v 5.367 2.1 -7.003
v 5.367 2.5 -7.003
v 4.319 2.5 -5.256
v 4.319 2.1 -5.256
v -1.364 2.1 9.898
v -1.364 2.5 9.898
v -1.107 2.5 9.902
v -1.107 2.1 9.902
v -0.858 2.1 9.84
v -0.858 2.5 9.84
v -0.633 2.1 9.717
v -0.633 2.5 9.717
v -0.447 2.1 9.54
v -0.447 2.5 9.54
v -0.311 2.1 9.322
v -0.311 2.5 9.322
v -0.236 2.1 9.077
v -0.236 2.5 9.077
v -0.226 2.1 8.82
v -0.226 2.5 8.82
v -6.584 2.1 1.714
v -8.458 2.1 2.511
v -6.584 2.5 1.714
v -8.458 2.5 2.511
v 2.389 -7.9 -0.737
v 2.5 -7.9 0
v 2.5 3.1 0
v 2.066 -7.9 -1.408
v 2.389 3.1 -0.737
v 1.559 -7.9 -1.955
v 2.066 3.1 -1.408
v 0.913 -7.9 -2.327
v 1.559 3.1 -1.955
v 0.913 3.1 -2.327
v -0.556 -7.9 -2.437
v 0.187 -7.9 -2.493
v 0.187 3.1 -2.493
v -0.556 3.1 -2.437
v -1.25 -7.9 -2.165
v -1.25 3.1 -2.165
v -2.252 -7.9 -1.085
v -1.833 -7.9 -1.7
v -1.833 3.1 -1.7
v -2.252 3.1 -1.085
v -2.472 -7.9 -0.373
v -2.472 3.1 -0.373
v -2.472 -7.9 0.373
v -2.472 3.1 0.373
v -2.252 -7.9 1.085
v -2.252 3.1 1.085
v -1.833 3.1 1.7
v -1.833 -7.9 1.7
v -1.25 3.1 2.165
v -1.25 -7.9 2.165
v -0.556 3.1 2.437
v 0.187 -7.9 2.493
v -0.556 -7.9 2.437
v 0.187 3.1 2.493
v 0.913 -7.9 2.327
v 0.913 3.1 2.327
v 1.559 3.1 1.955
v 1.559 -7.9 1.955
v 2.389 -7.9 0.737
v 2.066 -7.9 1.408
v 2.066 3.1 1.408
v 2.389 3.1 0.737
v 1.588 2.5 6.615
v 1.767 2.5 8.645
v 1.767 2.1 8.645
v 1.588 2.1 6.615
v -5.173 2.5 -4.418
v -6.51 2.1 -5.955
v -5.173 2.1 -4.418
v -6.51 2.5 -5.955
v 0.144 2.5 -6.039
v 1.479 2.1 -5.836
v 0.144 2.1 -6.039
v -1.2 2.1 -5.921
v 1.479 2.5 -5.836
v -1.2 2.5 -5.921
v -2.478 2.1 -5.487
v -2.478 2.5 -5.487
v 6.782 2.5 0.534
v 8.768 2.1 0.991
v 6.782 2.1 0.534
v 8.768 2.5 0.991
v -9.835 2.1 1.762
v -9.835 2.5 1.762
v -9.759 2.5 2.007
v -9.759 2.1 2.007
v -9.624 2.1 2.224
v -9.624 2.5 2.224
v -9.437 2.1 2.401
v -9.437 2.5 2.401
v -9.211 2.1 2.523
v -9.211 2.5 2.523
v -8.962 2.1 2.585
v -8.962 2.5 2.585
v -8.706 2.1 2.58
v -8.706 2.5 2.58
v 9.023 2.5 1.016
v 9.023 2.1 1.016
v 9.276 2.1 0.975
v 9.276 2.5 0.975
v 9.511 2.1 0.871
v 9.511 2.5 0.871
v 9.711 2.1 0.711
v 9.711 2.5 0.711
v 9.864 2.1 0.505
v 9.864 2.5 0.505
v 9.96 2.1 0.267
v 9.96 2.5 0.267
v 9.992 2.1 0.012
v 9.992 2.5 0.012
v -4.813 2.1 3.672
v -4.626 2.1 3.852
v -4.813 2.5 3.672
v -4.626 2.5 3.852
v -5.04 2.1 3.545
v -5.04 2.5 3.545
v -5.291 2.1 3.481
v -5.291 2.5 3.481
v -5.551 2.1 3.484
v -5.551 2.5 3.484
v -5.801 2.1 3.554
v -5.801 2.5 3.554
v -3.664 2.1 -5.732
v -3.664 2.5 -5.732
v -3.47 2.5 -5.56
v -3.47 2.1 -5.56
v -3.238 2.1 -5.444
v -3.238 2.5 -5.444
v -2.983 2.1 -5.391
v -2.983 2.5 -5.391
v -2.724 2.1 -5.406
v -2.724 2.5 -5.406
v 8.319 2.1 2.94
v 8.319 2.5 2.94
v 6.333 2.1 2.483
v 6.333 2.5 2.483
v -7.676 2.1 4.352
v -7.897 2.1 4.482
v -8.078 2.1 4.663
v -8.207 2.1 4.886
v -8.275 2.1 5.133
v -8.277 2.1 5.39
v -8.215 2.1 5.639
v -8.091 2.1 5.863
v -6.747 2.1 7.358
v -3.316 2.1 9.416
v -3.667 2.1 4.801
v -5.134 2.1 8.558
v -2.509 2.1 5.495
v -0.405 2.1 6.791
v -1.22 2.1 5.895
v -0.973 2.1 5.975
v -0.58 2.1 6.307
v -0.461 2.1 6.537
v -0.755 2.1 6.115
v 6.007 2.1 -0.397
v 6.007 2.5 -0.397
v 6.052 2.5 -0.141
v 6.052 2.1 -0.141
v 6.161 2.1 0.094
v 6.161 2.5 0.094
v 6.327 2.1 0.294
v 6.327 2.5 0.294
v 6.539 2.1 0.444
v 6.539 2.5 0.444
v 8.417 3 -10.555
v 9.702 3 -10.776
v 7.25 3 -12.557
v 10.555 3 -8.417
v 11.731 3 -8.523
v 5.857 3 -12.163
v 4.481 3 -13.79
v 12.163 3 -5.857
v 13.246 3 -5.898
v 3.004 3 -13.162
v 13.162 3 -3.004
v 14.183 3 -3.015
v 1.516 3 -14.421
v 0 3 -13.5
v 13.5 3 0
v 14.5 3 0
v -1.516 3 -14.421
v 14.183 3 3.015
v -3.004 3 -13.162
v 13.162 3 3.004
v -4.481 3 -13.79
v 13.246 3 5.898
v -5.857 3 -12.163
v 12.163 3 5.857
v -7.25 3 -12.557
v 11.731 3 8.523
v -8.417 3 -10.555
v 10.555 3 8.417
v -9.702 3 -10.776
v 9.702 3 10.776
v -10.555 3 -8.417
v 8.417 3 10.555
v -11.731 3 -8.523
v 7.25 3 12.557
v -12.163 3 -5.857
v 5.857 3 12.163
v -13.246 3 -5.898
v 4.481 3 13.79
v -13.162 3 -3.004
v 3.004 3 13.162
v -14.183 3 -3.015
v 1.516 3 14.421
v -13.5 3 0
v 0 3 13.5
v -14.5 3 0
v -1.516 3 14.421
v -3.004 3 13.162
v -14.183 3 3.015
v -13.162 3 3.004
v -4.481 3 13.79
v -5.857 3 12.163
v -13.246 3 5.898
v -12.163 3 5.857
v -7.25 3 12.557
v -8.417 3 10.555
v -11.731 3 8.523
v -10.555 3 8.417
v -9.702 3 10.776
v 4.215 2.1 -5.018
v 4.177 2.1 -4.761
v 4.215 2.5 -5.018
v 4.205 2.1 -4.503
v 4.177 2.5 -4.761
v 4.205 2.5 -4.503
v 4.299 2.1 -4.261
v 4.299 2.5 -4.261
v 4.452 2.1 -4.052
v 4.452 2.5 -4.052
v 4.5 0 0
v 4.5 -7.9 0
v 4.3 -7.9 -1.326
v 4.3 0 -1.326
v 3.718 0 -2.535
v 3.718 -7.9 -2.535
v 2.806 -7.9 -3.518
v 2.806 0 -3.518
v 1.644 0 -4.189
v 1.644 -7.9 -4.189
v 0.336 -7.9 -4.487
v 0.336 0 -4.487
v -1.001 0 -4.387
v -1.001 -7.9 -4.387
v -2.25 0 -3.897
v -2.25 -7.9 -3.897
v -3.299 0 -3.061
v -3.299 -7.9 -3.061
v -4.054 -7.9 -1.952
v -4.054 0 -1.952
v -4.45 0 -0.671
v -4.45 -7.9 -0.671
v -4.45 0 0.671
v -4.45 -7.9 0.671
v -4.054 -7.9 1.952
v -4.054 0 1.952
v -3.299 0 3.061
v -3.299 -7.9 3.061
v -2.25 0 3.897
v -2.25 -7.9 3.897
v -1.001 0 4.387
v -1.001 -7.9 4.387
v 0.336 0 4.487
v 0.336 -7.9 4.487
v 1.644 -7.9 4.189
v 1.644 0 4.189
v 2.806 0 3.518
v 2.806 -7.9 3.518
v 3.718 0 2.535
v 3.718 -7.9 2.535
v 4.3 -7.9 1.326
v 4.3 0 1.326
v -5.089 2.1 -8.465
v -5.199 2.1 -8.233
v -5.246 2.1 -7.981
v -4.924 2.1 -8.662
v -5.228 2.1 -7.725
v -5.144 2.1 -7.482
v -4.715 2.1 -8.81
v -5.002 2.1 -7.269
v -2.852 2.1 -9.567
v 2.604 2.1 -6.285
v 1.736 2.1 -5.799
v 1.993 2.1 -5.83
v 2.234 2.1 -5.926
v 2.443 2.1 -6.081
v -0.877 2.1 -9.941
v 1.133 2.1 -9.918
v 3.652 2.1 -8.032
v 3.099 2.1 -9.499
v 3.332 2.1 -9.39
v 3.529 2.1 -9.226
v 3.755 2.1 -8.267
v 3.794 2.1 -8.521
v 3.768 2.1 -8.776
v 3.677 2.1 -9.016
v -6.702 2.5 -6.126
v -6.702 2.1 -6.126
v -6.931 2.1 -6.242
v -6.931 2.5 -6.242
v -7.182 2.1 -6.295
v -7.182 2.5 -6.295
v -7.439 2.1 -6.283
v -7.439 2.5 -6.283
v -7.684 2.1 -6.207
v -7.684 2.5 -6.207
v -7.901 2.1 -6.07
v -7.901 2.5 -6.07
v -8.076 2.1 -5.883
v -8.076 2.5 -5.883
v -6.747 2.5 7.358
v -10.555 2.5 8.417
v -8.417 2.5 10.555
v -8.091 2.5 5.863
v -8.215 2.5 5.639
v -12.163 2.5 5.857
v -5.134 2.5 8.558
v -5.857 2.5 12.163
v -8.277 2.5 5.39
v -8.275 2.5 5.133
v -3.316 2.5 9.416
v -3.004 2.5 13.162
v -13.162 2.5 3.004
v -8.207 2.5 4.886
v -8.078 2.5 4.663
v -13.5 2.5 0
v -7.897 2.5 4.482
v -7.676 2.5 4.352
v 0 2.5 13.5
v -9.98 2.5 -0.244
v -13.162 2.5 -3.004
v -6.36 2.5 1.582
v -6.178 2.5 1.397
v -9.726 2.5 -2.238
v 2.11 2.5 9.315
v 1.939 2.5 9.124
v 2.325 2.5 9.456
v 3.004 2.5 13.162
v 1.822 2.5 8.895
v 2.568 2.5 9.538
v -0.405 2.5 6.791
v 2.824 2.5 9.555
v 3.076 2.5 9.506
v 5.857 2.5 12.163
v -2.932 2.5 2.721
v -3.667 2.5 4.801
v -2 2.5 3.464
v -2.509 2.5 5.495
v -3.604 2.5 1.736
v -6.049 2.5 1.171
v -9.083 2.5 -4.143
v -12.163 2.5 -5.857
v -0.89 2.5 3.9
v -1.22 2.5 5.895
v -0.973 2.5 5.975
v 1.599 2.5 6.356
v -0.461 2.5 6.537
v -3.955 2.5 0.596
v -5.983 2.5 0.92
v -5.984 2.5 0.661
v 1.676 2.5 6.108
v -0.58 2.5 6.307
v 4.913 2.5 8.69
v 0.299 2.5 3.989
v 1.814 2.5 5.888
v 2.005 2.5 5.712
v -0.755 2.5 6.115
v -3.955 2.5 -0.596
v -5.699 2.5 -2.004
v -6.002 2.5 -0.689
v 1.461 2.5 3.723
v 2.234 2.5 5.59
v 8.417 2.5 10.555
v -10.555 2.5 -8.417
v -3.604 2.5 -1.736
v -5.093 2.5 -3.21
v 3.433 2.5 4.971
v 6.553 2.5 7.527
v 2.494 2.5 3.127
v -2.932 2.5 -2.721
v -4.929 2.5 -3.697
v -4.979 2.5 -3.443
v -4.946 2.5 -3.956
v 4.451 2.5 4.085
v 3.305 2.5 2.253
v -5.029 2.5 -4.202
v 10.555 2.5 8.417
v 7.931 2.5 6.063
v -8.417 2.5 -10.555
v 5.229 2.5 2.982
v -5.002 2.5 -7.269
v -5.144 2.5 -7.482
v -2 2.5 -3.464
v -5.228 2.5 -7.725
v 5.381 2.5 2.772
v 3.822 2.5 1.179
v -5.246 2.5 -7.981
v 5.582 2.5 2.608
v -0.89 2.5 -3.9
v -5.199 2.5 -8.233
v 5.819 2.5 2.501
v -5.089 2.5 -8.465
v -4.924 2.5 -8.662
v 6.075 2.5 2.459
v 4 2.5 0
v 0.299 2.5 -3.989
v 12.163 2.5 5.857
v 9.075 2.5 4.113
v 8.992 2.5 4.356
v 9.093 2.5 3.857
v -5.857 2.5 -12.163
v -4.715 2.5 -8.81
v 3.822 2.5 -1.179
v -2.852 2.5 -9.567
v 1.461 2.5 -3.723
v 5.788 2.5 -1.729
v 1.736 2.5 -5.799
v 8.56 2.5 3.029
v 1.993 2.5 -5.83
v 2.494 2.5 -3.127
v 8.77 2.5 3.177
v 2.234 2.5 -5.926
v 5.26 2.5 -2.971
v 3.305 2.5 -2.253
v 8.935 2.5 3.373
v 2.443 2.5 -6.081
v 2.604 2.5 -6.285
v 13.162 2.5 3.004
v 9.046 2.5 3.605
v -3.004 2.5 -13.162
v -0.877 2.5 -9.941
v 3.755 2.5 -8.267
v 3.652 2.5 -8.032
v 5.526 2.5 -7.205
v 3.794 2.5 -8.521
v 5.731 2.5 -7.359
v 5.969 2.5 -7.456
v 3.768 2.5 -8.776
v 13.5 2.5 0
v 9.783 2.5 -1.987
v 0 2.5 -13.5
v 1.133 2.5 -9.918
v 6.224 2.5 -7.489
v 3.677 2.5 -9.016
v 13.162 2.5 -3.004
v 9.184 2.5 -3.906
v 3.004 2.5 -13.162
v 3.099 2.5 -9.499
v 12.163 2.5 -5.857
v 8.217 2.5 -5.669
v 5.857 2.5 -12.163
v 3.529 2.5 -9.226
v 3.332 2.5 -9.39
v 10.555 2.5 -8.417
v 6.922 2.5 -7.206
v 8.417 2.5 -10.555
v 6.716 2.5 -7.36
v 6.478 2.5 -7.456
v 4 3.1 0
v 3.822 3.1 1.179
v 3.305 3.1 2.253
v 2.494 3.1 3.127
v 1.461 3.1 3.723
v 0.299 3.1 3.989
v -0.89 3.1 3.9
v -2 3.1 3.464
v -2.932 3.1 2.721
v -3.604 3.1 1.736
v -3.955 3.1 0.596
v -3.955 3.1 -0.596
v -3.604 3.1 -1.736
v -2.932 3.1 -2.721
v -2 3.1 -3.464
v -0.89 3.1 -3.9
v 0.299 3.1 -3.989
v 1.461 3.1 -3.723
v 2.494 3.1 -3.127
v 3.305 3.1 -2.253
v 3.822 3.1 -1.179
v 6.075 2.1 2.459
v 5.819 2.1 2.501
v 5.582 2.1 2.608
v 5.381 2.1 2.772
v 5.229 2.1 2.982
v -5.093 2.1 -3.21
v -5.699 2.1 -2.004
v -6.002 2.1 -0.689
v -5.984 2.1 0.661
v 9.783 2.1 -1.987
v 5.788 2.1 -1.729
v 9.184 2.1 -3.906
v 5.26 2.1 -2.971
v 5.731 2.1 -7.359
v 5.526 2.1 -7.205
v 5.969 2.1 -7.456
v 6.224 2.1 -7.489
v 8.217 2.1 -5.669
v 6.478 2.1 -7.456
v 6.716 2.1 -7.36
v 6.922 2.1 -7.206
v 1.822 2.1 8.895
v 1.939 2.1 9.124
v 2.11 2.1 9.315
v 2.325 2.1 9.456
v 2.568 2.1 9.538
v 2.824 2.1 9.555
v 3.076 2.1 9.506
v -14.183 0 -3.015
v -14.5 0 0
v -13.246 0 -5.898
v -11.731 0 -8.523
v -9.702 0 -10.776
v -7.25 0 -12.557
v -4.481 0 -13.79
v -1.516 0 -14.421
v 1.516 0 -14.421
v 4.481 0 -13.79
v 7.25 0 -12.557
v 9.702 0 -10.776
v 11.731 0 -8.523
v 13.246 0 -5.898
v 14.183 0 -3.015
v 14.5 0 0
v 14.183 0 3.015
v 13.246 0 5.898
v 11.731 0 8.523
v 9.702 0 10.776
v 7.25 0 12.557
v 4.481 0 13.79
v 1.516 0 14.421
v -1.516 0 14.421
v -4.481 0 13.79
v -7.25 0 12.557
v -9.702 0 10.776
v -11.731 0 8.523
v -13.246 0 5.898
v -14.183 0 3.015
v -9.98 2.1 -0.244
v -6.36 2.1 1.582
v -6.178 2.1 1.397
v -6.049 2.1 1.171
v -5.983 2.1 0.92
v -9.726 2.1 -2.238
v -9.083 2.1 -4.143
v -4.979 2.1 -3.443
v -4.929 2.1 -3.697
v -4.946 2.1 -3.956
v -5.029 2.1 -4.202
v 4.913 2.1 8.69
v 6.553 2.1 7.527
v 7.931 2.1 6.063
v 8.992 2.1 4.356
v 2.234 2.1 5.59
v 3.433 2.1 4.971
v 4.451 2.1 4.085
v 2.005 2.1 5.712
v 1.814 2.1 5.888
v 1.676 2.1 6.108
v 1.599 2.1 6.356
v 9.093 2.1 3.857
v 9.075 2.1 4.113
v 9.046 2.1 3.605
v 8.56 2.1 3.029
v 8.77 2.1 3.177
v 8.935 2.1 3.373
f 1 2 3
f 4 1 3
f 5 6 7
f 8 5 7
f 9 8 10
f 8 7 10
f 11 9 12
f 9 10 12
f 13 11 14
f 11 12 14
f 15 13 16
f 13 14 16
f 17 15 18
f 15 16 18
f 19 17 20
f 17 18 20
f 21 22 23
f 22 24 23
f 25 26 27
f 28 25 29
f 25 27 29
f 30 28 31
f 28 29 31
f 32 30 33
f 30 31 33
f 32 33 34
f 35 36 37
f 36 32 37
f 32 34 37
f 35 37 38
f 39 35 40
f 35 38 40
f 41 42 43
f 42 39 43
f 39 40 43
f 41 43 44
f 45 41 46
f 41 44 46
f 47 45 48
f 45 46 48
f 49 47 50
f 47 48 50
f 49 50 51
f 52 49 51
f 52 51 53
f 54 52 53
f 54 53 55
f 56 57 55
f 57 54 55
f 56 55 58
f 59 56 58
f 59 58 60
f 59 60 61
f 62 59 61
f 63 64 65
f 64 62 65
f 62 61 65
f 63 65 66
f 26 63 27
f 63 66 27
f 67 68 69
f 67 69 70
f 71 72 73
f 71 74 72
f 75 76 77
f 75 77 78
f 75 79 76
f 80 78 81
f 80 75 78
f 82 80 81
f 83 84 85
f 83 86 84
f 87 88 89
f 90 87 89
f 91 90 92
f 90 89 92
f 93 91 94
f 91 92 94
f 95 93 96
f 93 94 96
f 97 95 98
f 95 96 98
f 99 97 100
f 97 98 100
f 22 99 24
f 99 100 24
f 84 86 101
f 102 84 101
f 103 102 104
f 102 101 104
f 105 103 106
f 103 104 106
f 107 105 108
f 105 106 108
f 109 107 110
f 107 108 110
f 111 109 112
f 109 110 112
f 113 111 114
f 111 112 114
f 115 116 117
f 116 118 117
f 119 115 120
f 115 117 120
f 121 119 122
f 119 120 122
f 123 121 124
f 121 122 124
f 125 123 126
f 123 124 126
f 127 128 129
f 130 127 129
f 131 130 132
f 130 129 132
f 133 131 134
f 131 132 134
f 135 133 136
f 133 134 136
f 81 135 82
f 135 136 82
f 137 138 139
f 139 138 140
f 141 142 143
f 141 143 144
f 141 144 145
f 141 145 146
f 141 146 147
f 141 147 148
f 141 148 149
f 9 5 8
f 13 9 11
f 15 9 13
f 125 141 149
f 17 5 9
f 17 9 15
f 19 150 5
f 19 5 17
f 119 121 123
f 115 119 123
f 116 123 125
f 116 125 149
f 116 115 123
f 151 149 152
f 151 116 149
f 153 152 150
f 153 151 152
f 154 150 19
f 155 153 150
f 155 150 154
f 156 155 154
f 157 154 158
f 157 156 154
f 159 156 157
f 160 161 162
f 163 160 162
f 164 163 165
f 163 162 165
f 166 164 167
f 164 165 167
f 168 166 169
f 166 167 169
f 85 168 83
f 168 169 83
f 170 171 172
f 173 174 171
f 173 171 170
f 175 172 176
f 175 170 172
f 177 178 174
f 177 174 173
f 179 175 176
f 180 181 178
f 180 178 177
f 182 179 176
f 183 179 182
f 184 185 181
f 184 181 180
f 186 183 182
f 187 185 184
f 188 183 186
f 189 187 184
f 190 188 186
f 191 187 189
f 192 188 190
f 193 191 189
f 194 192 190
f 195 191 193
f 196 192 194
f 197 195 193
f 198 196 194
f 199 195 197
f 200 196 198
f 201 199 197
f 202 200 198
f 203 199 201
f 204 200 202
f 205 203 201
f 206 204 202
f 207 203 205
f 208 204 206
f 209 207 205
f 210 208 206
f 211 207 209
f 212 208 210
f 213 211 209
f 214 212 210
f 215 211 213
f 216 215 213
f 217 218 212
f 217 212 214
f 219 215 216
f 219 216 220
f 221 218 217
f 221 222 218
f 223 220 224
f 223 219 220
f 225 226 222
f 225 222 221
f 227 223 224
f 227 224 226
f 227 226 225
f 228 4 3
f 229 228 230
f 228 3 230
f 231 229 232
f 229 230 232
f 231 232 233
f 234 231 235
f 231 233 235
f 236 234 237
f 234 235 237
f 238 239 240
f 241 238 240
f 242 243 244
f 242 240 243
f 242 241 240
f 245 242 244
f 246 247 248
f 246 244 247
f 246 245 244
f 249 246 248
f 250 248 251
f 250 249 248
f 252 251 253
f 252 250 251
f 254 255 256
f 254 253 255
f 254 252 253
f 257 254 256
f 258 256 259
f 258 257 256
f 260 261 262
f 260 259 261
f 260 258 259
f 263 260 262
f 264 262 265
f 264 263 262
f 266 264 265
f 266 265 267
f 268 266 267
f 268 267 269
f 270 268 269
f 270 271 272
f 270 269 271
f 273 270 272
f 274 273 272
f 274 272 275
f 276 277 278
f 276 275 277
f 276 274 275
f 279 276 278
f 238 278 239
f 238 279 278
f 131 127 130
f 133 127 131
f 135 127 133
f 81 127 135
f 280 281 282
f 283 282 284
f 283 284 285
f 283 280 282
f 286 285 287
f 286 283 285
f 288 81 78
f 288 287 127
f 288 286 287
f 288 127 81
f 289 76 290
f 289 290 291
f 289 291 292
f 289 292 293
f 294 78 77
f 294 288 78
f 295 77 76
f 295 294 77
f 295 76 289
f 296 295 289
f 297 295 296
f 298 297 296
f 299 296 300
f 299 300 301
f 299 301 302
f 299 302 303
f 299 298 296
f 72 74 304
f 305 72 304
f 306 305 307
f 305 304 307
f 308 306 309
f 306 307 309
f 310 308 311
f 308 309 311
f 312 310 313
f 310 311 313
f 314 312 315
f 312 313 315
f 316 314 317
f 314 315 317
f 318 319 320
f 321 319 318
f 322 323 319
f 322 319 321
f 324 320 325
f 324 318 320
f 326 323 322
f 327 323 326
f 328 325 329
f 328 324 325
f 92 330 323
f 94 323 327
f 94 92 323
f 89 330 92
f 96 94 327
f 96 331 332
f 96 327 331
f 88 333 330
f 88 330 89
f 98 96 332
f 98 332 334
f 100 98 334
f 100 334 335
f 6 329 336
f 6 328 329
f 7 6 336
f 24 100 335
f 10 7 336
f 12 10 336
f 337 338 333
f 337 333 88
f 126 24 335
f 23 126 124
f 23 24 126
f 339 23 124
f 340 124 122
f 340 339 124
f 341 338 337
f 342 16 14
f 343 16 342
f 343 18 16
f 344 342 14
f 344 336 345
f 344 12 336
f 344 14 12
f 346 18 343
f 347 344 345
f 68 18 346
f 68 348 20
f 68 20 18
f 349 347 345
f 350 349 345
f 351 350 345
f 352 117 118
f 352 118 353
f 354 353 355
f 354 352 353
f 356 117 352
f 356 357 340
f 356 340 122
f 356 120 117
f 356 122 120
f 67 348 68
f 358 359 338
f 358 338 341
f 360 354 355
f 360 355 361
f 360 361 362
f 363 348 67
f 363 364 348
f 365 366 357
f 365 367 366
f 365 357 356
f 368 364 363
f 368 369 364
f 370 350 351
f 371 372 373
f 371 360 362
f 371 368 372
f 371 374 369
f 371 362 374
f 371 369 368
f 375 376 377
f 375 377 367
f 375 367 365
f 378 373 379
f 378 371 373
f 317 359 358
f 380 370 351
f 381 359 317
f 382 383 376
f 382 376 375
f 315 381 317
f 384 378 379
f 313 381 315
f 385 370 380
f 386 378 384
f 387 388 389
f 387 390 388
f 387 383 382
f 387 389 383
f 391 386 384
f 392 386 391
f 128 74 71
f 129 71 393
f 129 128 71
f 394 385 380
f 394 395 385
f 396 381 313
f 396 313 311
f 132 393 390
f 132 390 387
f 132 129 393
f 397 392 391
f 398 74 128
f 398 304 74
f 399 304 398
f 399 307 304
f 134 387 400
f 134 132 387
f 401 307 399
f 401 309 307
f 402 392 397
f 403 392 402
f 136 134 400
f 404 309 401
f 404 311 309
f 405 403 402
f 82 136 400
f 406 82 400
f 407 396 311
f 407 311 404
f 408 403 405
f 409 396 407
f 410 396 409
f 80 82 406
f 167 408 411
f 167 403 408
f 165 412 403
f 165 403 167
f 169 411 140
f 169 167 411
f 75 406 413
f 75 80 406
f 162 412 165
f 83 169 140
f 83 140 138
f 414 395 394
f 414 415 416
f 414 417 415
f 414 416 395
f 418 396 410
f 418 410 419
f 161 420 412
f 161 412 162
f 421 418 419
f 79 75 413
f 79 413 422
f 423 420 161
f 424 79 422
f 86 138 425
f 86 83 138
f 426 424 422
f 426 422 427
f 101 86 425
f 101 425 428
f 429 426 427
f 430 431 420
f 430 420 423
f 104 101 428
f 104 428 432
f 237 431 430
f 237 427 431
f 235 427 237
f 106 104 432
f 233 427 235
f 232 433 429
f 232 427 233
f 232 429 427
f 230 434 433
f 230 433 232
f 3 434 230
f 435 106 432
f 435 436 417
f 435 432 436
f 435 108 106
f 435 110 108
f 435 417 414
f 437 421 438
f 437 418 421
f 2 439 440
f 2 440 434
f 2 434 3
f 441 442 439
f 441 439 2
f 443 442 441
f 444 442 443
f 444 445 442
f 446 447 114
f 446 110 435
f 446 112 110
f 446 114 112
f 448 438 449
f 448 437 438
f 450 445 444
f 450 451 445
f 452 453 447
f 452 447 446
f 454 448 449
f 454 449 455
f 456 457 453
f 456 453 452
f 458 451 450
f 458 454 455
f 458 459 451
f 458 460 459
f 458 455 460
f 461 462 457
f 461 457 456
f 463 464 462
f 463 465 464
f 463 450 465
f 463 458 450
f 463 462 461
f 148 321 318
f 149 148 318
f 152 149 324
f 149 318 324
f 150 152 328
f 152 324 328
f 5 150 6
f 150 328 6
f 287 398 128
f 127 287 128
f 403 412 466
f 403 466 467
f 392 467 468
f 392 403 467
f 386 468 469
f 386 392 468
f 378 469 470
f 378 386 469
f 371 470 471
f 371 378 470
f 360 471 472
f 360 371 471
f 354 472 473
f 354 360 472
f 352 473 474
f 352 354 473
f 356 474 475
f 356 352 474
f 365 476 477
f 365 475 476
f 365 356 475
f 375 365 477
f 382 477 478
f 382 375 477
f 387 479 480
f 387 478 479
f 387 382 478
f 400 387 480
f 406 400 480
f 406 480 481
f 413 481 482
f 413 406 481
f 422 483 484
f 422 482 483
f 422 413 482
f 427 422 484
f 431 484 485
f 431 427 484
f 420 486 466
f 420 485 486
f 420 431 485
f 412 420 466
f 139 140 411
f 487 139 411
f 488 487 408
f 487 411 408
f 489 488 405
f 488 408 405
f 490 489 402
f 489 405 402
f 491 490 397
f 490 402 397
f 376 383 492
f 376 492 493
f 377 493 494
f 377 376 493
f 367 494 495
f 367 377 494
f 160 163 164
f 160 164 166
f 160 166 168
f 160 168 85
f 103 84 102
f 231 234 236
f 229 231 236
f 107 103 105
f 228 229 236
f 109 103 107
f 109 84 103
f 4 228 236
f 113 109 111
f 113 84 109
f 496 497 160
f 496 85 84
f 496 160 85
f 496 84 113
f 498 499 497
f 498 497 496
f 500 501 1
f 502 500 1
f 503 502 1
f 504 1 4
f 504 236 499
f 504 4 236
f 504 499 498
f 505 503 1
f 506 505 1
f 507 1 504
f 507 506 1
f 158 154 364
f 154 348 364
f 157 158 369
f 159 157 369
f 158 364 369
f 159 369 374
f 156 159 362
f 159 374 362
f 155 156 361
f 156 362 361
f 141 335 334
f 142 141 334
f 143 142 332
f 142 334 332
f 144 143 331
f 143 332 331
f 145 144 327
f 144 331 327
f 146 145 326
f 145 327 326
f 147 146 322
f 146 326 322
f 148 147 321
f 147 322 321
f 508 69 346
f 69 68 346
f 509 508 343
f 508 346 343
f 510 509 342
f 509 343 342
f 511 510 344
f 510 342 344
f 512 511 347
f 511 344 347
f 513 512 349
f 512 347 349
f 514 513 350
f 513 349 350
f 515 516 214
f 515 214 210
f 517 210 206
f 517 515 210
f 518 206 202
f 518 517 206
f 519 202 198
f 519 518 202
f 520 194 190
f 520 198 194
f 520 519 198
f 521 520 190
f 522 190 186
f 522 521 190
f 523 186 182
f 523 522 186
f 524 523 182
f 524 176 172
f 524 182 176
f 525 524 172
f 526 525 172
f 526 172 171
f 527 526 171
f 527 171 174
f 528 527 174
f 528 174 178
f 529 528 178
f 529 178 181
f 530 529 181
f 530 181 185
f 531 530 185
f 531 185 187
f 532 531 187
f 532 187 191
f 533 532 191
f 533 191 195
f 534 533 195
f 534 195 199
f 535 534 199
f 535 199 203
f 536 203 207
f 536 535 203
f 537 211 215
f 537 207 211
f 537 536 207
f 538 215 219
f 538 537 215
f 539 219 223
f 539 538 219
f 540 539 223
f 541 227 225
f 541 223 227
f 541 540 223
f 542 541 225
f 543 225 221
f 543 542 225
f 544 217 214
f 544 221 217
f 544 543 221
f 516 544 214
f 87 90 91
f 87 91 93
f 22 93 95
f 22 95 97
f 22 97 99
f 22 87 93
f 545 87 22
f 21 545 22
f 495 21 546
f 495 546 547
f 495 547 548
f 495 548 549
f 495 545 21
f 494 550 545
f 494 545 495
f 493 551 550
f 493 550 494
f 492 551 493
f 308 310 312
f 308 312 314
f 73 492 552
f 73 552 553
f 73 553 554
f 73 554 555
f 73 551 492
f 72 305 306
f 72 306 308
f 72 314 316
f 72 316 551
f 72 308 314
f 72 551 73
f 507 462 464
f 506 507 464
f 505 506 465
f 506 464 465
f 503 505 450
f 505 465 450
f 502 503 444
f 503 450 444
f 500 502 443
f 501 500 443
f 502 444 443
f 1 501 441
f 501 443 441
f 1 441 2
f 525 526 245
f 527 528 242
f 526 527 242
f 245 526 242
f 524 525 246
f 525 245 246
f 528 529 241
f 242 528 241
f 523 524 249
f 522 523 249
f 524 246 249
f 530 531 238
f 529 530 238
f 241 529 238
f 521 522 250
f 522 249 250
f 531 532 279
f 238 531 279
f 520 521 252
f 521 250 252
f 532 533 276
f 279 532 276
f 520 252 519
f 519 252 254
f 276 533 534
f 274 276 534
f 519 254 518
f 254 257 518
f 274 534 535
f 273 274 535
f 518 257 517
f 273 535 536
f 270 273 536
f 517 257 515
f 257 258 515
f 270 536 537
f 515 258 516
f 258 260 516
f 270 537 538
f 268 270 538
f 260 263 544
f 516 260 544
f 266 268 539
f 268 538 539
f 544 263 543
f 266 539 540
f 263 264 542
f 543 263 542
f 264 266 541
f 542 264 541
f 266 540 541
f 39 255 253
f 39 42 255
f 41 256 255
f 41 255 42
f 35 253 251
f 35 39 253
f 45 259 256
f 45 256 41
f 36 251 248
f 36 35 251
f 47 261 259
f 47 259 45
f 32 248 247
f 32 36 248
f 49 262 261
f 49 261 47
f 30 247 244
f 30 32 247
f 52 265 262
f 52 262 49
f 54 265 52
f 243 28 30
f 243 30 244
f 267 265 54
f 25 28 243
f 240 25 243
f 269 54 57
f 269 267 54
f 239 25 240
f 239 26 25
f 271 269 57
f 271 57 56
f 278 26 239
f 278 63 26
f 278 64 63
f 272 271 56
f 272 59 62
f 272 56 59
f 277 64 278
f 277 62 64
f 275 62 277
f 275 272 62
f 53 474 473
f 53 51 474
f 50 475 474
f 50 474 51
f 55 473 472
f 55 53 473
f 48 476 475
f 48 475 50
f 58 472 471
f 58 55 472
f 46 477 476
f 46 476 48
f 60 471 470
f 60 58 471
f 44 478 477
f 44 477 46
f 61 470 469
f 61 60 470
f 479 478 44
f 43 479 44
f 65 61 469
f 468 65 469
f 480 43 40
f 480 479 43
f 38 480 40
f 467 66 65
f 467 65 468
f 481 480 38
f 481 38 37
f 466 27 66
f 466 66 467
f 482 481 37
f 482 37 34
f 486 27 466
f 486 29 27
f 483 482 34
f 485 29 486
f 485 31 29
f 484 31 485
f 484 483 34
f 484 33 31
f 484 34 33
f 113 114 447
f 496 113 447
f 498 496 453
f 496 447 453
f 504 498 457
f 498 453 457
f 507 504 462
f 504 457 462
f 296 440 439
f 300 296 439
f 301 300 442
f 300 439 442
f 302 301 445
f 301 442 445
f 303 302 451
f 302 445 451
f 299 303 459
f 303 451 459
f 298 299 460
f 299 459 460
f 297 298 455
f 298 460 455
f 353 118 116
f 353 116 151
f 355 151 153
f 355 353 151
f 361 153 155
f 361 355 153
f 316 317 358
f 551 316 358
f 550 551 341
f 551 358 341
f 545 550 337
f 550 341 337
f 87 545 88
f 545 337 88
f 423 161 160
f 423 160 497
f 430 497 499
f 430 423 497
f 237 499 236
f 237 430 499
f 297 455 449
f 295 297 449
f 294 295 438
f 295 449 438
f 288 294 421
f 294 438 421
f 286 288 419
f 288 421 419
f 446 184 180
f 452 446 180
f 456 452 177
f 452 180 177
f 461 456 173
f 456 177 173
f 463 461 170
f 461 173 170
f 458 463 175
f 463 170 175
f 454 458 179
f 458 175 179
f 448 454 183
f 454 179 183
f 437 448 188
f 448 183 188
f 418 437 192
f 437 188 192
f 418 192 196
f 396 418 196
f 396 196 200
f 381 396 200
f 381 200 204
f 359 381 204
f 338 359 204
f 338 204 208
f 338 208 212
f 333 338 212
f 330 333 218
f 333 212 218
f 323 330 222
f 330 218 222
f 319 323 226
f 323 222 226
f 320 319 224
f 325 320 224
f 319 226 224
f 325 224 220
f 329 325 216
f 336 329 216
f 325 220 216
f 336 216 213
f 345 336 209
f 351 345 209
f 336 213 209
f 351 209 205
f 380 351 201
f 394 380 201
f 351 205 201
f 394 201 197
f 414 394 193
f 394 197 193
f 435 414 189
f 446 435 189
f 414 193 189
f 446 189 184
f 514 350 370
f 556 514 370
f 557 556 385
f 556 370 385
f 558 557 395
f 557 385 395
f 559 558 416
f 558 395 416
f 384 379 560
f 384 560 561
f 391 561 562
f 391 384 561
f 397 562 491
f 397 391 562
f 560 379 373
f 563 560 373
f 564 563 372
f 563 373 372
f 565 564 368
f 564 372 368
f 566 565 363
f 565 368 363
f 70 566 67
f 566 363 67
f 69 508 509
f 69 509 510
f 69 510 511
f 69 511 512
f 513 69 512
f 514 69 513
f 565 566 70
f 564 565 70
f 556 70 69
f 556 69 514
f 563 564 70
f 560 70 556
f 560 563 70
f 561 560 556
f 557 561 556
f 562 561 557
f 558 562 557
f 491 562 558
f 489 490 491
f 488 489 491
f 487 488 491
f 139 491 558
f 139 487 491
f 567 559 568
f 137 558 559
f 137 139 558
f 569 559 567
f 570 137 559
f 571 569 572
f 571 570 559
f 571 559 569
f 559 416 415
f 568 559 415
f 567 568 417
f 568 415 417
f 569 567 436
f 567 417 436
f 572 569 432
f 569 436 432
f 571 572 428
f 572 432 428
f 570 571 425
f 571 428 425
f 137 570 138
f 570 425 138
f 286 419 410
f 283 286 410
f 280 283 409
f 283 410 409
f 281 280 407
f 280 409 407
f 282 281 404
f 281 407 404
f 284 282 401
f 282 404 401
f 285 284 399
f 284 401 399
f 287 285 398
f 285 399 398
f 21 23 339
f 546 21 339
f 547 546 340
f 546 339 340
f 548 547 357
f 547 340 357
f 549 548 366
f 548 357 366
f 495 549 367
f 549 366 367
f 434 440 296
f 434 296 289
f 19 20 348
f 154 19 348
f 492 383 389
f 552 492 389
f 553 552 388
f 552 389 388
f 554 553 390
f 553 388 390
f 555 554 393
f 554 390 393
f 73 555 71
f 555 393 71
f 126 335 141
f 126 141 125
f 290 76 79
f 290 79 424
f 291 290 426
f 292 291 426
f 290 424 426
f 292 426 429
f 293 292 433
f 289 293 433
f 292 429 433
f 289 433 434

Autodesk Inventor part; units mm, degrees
ref_plane "YZ Plane" through (0, 0, 0) normal (1, 0, 0) x (0, 1, 0)
ref_plane "XZ Plane" through (0, 0, 0) normal (0, 1, 0) x (-1, 0, 0)
ref_plane "XY Plane" through (0, 0, 0) normal (0, 0, 1) x (1, 0, 0)
sketch "Sketch1" plane through (0, 0, 0) normal (0, 1, 0) x (-1, 0, 0)
  circle A0 centre (0, 0) radius 14.5
  dimension "d0" = 29
extrude "Extrusion1" add sketch "Sketch1" along normal blind 3
sketch "Sketch2" plane through (0, 3, 0) normal (0, 1, 0) x (1, 0, 0)
  circle A0 centre (0, 0) radius 13.5
  dimension "d3" = 27
extrude "Extrusion2" cut sketch "Sketch2" against normal blind 0.5
sketch "Sketch3" plane through (0, 2.5, 0) normal (0, 1, 0) x (1, 0, 0)
  circle A0 centre (0, 0) radius 11
  circle A1 centre (0, 0) radius 5
  line L0 (-6.5333, 7.5044) -> (-3.8846, 4.462) construction
  line L1 (3.0432, 5.0733) -> (5.1182, 8.5325) construction
  arc A2 (4.6868, 9.9516) -> (-6.3569, 8.9771) centre (0, 0) ccw
  arc A3 (1.8214, 4.6564) -> (-2.6087, 4.2656) centre (0, 0) ccw
  line L2 (-7.2228, 8.2965) -> (-3.2831, 3.7711)
  line L3 (5.6584, 9.433) -> (2.572, 4.2877)
  arc A4 (-6.3569, 8.9771) -> (-6.5333, 7.5044) centre (-5.779, 8.161) ccw
  arc A5 (-3.8846, 4.462) -> (-2.6087, 4.2656) centre (-3.1304, 5.1187) ccw
  arc A6 (1.8214, 4.6564) -> (3.0432, 5.0733) centre (2.1857, 5.5877) ccw
  arc A7 (5.1182, 8.5325) -> (4.6868, 9.9516) centre (4.2607, 9.0469) ccw
  arc A8 (3.0991, 9.499) -> (-4.7146, 8.8096) centre (0.0131, -0.1481) ccw
  arc A9 (1.4786, 5.8357) -> (-2.4777, 5.4866) centre (-0.0344, 0.3898) ccw
  line L4 (-5.0021, 7.2686) -> (-3.6641, 5.7318)
  line L5 (3.652, 8.0321) -> (2.6039, 6.2848)
  arc A10 (-4.7146, 8.8096) -> (-5.0021, 7.2686) centre (-4.2478, 7.9252) ccw
  arc A11 (-3.6641, 5.7318) -> (-2.4777, 5.4866) centre (-2.9099, 6.3884) ccw
  arc A12 (1.4786, 5.8357) -> (2.6039, 6.2848) centre (1.7463, 6.7992) ccw
  arc A13 (3.652, 8.0321) -> (3.0991, 9.499) centre (2.7944, 8.5466) ccw
  arc A14 (9.9918, -0.0121) -> (6.9215, 7.2061) centre (-0.1369, -0.0582) ccw
  arc A15 (6.9215, 7.2061) -> (5.3671, 7.0033) centre (6.2246, 6.4889) ccw
  line L6 (5.3671, 7.0033) -> (4.319, 5.256)
  arc A16 (4.319, 5.256) -> (4.4525, 4.0519) centre (5.1765, 4.7416) ccw
  arc A17 (6.007, 0.3971) -> (4.4525, 4.0519) centre (0.3601, 0.1532) ccw
  arc A18 (6.007, 0.3971) -> (6.7819, -0.5343) centre (7.0061, 0.4402) ccw
  line L7 (8.7676, -0.9912) -> (6.7819, -0.5343)
  arc A19 (8.7676, -0.9912) -> (9.9918, -0.0121) centre (8.9918, -0.0166) ccw
  arc A20 (3.0761, -9.5065) -> (8.9923, -4.3559) centre (-0.0977, 0.1122) ccw
  arc A21 (8.9923, -4.3559) -> (8.3191, -2.9403) centre (8.0949, -3.9148) ccw
  line L8 (8.3191, -2.9403) -> (6.3334, -2.4834)
  arc A22 (6.3334, -2.4834) -> (5.2294, -2.9825) centre (6.1092, -3.4579) ccw
  arc A23 (2.2339, -5.5903) -> (5.2294, -2.9825) centre (0.2569, -0.2951) ccw
  arc A24 (2.2339, -5.5903) -> (1.5876, -6.615) centre (2.5837, -6.5271) ccw
  line L9 (1.7667, -8.6447) -> (1.5876, -6.615)
  arc A25 (1.7667, -8.6447) -> (3.0761, -9.5065) centre (2.7628, -8.5568) ccw
  arc A26 (-8.0906, -5.8632) -> (-1.3639, -9.8982) centre (0.0765, 0.1275) ccw
  arc A27 (-1.3639, -9.8982) -> (-0.2256, -8.8205) centre (-1.2217, -8.9084) ccw
  line L10 (-0.2256, -8.8205) -> (-0.4047, -6.7908)
  arc A28 (-0.4047, -6.7908) -> (-1.2205, -5.8951) centre (-1.4008, -6.8787) ccw
  arc A29 (-4.6264, -3.8521) -> (-1.2205, -5.8951) centre (-0.2013, -0.3355) ccw
  arc A30 (-4.6264, -3.8521) -> (-5.8007, -3.554) centre (-5.4093, -4.4742) ccw
  line L11 (-7.6757, -4.3516) -> (-5.8007, -3.554)
  arc A31 (-7.6757, -4.3516) -> (-8.0906, -5.8632) centre (-7.2843, -5.2718) ccw
  arc A32 (-8.0764, 5.8828) -> (-9.8353, -1.7615) centre (0.1449, -0.0333) ccw
  arc A33 (-9.8353, -1.7615) -> (-8.4585, -2.5111) centre (-8.8499, -1.5909) ccw
  line L12 (-8.4585, -2.5111) -> (-6.5835, -1.7136)
  arc A34 (-6.5835, -1.7136) -> (-5.9837, -0.6609) centre (-6.9749, -0.7934) ccw
  arc A35 (-5.0932, 3.2096) -> (-5.9837, -0.6609) centre (-0.3813, 0.0877) ccw
  arc A36 (-5.0932, 3.2096) -> (-5.1726, 4.4185) centre (-5.9268, 3.7619) ccw
  line L13 (-6.5105, 5.9553) -> (-5.1726, 4.4185)
  arc A37 (-6.5105, 5.9553) -> (-8.0764, 5.8828) centre (-7.2647, 5.2987) ccw
  point P0 (-10.1224, -4.3055)
  point P1 (0.9668, -10.9574)
  point P2 (10.7199, -2.4665)
  point P3 (-5.779, 8.161)
  point P4 (-3.1304, 5.1187)
  point P5 (2.1857, 5.5877)
  point P6 (3.9008, 4.5589)
  point P7 (5.9897, -0.352)
  point P8 (5.5412, -2.3011)
  point P9 (1.5161, -5.8053)
  point P10 (-0.4761, -5.9811)
  point P11 (-5.0527, -3.2358)
  point P12 (-5.8355, -1.3954)
  point P13 (-4.6388, 3.8054)
  dimension "d6" = 22
  dimension "d7" = 10
  dimension "d10" = 360
  dimension "d12" = 1
  dimension "d13" = 1
  dimension "d14" = 1
  dimension "d17" = 360
extrude "Extrusion3" cut sketch "Sketch3" against normal blind 0.4 contours A13 L5 A12 A9 A11 L4 A10 A8 | A19 L7 A18 A17 A16 L6 A15 A14 | A25 L9 A24 A23 A22 L8 A21 A20 | A31 L11 A30 A29 A28 L10 A27 A26 | A37 L13 A36 A35 A34 L12 A33 A32
sketch "Sketch4" plane through (0, 2.5, 0) normal (0, 1, 0) x (1, 0, 0)
  circle A0 centre (0, 0) radius 4
  dimension "d21" = 8
extrude "Extrusion4" add sketch "Sketch4" along normal blind 0.6
sketch "Sketch5" plane through (0, 3.1, 0) normal (0, 1, 0) x (1, 0, 0)
  circle A0 centre (0, 0) radius 2.5
  dimension "d24" = 5
extrude "Extrusion5" cut sketch "Sketch5" against normal blind 14.15
sketch "Sketch6" plane through (0, 0, 0) normal (0, -1, 0) x (1, 0, 0)
  circle A0 centre (0, 0) radius 2.5 projected
  circle A1 centre (0, 0) radius 4.5
  dimension "d27" = 9
extrude "Extrusion6" add sketch "Sketch6" along normal blind 7.9
properties part number "inner_wheel" material "PAEK Plastic"
